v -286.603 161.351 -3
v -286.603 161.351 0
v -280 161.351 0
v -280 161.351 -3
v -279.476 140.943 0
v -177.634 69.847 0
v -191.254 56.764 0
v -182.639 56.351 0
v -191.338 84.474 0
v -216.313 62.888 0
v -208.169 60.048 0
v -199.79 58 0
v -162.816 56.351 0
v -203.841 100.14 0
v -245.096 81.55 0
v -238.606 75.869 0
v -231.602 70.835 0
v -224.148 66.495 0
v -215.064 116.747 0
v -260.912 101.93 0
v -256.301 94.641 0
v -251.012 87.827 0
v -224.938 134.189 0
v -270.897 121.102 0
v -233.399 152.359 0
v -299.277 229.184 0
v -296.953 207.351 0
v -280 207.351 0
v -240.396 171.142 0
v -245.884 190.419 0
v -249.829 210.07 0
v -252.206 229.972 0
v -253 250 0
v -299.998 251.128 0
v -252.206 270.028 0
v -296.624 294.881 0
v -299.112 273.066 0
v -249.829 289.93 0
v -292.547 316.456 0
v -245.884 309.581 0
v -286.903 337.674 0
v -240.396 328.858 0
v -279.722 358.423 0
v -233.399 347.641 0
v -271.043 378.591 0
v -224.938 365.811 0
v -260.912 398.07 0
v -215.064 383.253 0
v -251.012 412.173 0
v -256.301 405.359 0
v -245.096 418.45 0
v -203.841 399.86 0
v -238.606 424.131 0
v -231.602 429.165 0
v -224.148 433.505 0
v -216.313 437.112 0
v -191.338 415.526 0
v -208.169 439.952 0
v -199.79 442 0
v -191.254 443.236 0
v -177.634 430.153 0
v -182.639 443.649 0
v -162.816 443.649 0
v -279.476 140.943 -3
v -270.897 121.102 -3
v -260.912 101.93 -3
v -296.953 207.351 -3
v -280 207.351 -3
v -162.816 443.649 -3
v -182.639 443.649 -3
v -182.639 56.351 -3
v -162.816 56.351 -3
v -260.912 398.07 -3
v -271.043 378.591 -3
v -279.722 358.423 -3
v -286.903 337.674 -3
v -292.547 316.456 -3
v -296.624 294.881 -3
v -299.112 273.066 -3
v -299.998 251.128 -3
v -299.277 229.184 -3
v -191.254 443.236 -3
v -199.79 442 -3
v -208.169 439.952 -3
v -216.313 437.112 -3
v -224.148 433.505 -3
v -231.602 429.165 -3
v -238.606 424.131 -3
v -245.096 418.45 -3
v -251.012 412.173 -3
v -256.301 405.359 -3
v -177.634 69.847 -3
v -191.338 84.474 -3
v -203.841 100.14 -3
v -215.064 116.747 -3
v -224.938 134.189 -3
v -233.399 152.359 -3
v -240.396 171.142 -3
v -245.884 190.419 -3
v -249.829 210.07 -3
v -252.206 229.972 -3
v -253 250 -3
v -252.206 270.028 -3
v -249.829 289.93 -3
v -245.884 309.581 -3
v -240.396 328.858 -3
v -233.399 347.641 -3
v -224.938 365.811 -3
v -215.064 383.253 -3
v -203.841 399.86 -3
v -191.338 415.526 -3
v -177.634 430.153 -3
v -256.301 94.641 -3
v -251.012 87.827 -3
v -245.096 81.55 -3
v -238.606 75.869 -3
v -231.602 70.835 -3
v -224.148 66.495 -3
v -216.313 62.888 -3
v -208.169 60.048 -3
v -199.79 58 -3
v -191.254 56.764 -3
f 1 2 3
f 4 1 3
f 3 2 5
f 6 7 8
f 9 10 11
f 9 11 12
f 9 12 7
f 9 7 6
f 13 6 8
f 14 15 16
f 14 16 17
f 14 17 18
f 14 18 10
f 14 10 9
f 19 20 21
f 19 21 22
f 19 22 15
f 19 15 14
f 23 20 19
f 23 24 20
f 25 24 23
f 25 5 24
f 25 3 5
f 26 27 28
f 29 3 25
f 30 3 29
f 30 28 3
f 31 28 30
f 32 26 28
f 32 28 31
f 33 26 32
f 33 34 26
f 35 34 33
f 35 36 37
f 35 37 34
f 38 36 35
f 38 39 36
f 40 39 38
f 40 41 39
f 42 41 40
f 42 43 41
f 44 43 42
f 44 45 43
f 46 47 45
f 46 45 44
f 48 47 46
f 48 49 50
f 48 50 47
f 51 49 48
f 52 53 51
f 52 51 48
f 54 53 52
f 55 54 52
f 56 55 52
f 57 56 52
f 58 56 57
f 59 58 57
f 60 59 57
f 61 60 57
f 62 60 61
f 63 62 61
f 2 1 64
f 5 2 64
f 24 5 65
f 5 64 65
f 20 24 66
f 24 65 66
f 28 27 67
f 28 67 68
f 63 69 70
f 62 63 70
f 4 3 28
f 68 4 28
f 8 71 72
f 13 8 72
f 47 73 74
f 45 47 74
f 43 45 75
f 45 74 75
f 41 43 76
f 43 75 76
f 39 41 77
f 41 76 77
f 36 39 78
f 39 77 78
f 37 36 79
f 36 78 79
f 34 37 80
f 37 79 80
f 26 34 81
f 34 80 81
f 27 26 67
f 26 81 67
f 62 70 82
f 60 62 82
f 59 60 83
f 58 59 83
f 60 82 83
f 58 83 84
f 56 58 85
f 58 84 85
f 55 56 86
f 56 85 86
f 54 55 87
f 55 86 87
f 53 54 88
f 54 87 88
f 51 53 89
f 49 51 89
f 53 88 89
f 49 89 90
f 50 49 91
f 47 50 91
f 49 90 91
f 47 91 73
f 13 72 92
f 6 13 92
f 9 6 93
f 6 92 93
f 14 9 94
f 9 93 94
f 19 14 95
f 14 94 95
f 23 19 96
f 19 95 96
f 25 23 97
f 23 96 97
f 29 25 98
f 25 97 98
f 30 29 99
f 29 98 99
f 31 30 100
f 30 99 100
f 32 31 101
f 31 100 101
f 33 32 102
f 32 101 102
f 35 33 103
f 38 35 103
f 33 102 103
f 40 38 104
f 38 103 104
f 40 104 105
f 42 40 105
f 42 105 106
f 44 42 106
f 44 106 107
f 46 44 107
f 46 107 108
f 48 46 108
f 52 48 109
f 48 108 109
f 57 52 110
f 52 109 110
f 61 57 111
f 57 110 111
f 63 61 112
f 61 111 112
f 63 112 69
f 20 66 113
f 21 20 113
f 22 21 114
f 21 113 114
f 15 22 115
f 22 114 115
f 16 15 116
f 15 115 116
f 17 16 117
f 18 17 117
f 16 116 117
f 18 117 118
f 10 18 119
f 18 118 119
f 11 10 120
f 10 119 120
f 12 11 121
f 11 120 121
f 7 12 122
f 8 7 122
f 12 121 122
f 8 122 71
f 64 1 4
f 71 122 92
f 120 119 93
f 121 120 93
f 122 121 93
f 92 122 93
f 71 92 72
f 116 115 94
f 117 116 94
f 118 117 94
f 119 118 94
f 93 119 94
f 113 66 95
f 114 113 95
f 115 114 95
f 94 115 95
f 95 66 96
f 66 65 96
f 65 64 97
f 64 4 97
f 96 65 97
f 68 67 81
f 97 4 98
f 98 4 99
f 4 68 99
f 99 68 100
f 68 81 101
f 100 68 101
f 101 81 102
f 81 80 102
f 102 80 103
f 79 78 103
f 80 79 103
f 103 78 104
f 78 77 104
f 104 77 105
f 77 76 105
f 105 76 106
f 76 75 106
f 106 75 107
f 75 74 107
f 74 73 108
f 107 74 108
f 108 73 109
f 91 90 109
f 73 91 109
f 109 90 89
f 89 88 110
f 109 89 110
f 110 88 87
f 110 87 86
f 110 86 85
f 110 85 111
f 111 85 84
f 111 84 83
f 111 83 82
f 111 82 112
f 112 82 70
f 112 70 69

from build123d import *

# Parameters (mm, degrees)
FLANGE_BASE1_START    = -3
FLANGE_BASE1_DEPTH    = 3
ESBO_O2_W             = 58.045623223
ESBO_O2_H             = 46
CORTE_EXTRUS_O1_DEPTH = 10
CORTE_EXTRUS_O2_START = -10
CORTE_EXTRUS_O2_DEPTH = 10


# Read off the part's stored shape, not the designer's step: Flange-base1
with BuildPart() as part:
    # Flange-base1 outline → Flange-base1 (new body)
    with BuildSketch(Plane.XY.offset(FLANGE_BASE1_START)):
        with BuildLine():
            ThreePointArc((-158.113883008, 56.35083269), (-250, 250), (-158.113883008, 443.64916731))
            Line((-158.113883008, 443.64916731), (-182.638577841, 443.64916731))
            ThreePointArc((-182.638577841, 443.64916731), (-227.927116936, 431.424151892), (-260.912254059, 398.070239015))
            ThreePointArc((-260.912254059, 398.070239015), (-300, 250), (-260.912254059, 101.929760985))
            ThreePointArc((-260.912254059, 101.929760985), (-227.927116936, 68.575848108), (-182.638577841, 56.35083269))
            Line((-182.638577841, 56.35083269), (-158.113883008, 56.35083269))
        make_face()
    extrude(amount=FLANGE_BASE1_DEPTH)

    # Esboço2 → Corte-extrusão1 (cut)
    with BuildSketch(Plane.XY):
        with Locations((-309.022811612, 184.35083269)):
            Rectangle(ESBO_O2_W, ESBO_O2_H)
    extrude(amount=-CORTE_EXTRUS_O1_DEPTH, mode=Mode.SUBTRACT)

    # Esboço3 → Corte-extrusão2 (cut)
    with BuildSketch(Plane.XY.offset(CORTE_EXTRUS_O2_START)):
        with BuildLine():
            Line((-160.011249605, 445.972957318), (-158.113883008, 443.64916731))
            ThreePointArc((-158.113883008, 443.64916731), (-250, 250), (-158.113883008, 56.35083269))
            Line((-158.113883008, 56.35083269), (-160.011249605, 54.027042682))
            ThreePointArc((-160.011249605, 54.027042682), (-253, 250), (-160.011249605, 445.972957318))
        make_face()
    extrude(amount=CORTE_EXTRUS_O2_DEPTH, mode=Mode.SUBTRACT)


solid = part.part
